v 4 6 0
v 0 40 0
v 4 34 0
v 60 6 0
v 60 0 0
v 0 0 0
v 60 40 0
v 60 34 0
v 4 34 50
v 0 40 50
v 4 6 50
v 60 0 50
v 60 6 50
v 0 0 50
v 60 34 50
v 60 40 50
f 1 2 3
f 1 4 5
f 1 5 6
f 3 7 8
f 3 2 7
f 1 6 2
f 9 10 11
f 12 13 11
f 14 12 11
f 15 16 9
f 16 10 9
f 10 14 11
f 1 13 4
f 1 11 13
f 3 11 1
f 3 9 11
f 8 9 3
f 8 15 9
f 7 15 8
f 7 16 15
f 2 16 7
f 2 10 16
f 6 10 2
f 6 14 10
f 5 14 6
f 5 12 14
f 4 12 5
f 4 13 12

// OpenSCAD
$fn = 32;

// ----------------------------------------------------------------------
// Structural section: channel 60 x 40 mm
// ----------------------------------------------------------------------

// --- parameters (mm) ---
sec_w = 60;               // channel width, X
sec_h = 40;               // channel height, Y
flange_t = 6;             // flange thickness
web_t = 4;                // web thickness
plate_t = 50;             // cut length, Z (extrusion height)

profile = [[0, 0], [60, 0], [60, 6], [4, 6], [4, 34], [60, 34], [60, 40], [0, 40]];  // primary outline, 8 points, counter clockwise

// --- the one profile operation ---
linear_extrude(height = plate_t) polygon(points = profile);
